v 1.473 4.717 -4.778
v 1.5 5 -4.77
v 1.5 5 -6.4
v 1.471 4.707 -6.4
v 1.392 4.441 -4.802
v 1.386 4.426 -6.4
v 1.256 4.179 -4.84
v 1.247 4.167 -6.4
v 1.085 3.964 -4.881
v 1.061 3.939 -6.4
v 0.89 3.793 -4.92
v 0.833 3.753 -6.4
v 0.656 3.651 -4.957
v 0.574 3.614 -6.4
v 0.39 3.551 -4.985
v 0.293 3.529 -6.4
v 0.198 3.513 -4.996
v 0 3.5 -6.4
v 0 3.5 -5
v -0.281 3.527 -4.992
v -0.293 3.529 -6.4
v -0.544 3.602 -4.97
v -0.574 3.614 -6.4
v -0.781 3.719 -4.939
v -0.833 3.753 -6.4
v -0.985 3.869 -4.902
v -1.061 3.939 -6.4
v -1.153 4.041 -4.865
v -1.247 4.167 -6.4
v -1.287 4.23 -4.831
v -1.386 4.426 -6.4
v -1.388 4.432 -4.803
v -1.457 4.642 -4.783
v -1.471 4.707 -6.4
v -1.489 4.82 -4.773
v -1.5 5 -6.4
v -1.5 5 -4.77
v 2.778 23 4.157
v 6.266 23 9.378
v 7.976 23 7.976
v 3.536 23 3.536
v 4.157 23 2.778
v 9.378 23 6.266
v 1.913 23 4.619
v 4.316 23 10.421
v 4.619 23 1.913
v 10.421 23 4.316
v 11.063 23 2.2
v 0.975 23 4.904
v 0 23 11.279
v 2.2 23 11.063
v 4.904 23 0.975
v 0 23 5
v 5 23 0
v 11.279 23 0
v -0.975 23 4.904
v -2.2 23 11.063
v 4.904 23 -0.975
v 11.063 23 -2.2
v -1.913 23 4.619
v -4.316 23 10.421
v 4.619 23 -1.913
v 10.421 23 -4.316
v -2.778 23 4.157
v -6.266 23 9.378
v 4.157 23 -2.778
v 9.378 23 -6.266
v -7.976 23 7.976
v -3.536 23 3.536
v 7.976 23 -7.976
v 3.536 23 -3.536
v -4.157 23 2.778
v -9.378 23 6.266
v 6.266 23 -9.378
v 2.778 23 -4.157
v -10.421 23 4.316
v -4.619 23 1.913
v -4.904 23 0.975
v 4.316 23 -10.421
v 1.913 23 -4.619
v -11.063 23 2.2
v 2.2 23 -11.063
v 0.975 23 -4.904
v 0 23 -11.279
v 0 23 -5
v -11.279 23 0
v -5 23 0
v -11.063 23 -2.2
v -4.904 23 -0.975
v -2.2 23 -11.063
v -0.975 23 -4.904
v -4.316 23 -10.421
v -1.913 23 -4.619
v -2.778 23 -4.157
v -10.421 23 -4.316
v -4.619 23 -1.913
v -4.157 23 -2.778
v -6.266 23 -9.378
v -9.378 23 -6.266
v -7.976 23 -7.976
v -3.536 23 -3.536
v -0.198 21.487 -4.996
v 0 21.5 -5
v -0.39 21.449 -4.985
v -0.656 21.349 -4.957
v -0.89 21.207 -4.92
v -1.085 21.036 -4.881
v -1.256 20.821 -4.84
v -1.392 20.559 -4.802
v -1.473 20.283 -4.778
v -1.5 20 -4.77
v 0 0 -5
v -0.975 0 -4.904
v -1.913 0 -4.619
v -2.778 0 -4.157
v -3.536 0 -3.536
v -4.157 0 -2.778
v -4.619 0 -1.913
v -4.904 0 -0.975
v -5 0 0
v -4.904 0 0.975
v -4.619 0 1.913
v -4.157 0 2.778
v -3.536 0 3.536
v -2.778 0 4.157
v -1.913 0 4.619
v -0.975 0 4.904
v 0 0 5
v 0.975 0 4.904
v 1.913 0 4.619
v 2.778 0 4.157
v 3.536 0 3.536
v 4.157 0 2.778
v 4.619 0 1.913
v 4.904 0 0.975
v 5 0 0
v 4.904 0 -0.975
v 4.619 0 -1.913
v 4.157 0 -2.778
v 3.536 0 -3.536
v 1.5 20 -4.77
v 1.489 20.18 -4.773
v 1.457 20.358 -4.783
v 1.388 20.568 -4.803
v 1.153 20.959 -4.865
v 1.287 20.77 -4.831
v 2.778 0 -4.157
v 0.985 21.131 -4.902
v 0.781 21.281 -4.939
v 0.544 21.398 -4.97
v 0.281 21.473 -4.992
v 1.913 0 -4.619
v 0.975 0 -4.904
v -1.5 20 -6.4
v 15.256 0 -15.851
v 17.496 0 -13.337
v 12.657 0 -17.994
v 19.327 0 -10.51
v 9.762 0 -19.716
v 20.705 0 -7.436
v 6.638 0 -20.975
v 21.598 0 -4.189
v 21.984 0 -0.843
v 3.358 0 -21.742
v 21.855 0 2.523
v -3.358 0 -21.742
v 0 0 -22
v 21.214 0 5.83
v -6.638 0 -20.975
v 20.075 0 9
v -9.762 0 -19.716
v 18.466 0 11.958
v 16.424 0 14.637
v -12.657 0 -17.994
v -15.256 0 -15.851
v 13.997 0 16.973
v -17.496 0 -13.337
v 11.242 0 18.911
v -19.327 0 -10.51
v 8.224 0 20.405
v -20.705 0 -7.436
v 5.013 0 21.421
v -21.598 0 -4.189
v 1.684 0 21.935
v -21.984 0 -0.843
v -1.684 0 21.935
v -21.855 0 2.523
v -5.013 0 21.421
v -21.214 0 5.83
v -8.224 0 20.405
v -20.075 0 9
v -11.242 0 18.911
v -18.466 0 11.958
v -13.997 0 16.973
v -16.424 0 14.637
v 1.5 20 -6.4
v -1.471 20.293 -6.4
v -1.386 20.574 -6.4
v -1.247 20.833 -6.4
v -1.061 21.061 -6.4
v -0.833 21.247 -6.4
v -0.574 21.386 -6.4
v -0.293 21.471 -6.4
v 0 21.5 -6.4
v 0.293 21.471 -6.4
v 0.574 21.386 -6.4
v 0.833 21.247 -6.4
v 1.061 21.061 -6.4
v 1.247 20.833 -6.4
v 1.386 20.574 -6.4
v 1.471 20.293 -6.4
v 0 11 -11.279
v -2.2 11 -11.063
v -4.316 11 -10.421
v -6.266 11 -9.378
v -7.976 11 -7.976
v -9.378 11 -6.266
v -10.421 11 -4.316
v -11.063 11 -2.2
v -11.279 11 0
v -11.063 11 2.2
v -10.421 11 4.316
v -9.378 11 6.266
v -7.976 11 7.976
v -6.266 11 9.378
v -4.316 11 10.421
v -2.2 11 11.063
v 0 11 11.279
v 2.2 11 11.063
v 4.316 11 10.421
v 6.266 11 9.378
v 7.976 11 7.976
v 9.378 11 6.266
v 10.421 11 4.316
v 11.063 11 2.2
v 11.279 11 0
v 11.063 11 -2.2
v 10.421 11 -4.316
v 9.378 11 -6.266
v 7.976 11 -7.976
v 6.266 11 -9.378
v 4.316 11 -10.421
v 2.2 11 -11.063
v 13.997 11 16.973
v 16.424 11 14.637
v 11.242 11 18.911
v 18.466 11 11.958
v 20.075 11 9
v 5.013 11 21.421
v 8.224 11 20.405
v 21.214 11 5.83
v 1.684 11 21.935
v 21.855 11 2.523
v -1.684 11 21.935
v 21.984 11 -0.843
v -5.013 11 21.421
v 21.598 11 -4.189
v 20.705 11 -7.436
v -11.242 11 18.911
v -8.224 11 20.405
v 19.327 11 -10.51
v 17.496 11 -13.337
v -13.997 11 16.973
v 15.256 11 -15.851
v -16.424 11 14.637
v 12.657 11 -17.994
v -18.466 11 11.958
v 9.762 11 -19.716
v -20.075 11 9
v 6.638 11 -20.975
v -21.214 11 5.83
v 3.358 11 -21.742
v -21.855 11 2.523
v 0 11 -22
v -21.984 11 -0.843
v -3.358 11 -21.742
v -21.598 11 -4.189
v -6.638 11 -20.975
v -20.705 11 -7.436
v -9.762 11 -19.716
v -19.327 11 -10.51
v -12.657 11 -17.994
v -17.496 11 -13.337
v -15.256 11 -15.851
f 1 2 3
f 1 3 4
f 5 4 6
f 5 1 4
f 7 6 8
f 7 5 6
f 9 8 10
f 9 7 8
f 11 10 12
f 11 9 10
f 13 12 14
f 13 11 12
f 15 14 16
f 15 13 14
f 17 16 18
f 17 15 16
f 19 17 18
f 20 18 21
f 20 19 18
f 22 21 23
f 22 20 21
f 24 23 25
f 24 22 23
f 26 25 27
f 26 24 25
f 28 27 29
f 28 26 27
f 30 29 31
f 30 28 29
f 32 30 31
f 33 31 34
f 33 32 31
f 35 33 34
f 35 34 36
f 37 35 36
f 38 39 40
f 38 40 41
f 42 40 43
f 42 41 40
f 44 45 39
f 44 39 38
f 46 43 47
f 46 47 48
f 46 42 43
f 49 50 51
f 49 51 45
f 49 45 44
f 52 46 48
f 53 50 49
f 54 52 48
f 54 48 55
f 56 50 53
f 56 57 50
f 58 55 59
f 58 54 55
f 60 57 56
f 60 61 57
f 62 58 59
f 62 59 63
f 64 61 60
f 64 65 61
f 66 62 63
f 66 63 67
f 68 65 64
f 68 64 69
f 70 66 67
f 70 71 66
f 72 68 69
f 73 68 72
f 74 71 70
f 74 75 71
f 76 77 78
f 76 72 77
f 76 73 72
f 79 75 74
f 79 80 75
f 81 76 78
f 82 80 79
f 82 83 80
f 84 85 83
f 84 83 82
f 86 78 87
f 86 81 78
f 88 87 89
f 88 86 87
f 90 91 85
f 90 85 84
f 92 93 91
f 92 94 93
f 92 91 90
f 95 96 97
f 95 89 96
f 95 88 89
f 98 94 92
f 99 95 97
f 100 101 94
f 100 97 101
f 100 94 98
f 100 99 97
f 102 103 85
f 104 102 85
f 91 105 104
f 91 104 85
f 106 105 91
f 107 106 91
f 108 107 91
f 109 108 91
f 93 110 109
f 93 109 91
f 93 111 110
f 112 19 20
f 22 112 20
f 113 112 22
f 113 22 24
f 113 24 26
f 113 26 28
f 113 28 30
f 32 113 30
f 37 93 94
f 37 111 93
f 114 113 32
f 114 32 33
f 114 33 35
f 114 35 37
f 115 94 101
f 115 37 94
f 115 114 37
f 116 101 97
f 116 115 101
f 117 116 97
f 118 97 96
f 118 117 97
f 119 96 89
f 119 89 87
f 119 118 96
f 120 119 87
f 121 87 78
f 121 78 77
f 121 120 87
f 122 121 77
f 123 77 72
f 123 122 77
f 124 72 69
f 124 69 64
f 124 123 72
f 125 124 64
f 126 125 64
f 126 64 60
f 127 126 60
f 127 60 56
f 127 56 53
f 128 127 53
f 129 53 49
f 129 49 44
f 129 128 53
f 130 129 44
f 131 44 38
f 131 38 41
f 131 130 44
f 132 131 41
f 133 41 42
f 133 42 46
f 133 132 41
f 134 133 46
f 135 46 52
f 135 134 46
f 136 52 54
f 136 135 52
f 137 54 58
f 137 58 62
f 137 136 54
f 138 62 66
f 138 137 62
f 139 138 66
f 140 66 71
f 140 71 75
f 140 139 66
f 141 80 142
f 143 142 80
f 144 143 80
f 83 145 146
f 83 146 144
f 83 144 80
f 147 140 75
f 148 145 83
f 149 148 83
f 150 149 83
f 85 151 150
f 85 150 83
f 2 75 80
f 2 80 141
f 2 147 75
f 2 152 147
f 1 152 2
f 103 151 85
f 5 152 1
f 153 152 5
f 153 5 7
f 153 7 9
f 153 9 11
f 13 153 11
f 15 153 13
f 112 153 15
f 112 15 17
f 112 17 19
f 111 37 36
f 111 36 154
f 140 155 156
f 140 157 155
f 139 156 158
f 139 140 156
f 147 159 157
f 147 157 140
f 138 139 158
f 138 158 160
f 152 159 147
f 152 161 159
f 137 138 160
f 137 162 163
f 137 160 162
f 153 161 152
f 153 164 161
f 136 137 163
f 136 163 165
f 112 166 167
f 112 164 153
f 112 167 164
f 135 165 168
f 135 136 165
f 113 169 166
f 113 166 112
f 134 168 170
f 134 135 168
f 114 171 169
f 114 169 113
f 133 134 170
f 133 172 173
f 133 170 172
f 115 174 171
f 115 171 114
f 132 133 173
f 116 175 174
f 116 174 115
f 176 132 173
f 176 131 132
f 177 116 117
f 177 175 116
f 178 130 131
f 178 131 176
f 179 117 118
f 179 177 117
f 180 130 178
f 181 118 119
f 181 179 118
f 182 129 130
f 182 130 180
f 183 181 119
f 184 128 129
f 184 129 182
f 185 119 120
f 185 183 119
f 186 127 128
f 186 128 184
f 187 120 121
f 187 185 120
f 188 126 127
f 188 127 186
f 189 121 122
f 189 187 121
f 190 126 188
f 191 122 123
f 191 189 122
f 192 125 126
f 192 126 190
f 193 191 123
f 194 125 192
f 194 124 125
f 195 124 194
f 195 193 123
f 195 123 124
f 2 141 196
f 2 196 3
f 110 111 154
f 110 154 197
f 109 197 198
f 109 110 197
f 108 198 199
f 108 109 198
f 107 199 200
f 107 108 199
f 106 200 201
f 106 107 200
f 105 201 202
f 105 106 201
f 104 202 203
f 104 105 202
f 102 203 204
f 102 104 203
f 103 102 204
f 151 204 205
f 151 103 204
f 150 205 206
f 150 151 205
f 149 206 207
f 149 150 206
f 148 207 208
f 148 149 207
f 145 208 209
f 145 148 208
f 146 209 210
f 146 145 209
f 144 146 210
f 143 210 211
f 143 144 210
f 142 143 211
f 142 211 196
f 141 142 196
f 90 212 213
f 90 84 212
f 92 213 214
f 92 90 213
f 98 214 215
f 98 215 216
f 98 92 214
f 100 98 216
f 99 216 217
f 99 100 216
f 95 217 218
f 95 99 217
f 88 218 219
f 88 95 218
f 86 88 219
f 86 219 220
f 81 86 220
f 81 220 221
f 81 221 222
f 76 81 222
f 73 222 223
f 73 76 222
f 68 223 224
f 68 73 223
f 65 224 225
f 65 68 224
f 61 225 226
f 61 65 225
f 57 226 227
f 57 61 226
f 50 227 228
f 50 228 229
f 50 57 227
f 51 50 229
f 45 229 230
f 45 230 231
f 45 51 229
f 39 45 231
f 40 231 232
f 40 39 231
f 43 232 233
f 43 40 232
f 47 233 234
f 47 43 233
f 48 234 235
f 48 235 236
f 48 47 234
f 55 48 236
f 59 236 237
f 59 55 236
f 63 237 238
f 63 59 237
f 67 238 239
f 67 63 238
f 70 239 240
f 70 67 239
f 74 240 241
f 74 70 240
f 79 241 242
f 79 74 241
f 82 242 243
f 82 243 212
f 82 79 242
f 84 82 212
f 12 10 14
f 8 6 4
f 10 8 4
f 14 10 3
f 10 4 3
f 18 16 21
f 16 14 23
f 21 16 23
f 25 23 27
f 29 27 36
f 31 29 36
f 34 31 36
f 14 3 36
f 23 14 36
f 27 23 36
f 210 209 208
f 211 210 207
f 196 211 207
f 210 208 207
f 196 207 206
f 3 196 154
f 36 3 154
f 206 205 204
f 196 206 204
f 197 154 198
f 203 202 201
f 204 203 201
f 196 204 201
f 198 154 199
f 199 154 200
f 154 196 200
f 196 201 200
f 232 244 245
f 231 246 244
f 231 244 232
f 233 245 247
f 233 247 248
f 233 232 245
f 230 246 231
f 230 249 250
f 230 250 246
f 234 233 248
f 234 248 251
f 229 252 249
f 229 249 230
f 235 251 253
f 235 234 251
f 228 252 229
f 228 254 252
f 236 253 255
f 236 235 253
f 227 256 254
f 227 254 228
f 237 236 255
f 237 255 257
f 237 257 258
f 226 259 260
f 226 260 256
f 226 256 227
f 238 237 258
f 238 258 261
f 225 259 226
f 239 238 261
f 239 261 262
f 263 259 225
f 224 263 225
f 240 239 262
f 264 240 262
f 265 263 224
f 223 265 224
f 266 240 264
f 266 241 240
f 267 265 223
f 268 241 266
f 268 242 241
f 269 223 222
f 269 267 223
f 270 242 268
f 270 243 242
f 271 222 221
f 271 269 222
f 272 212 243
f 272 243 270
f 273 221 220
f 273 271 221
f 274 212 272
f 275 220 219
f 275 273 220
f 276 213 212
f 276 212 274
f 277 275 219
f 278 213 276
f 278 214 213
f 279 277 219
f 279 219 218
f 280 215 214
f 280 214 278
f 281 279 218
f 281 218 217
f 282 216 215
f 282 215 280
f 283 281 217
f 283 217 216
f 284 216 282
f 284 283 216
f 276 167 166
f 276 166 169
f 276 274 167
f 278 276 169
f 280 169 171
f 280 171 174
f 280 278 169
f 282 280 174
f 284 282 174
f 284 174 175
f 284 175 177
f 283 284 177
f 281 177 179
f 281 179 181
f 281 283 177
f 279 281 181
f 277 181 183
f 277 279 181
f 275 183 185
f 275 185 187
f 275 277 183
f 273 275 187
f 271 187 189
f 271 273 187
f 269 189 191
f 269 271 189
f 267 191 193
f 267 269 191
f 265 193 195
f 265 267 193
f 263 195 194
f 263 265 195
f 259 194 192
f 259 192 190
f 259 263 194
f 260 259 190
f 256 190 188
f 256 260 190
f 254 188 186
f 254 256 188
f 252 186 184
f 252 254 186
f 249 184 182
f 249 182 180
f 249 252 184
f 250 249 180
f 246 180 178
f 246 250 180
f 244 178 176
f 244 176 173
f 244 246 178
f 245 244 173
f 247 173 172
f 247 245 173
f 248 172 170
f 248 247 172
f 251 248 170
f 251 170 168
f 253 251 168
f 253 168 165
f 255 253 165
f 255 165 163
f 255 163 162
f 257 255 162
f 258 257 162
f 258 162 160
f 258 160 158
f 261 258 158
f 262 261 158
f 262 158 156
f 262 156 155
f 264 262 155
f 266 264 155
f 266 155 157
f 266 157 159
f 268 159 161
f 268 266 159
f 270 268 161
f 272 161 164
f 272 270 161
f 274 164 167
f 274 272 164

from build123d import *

# Parameters (mm, degrees)
CUT_EXTRUDE_1_DEPTH = 6.4


with BuildPart() as part:
    # Эскиз1 → Повернуть1 (revolve)
    with BuildSketch(Plane.XY, mode=Mode.PRIVATE) as revolve_1_sk:
        Polygon((5, 23), (5, 0), (22, 0), (22, 11), (11.27928518, 11), (11.27928518, 23), align=None)
    revolve(revolve_1_sk.sketch.rotate(Axis((0, 0, 0), (0, 1, 0)), 90), axis=Axis((0, 0, 0), (0, 1, 0)))

    # Эскиз2 → Вырез-Вытянуть1 (cut)
    with BuildSketch(Plane.XY):
        with BuildLine():
            Line((-1.5, 5), (-1.5, 20))
            ThreePointArc((-1.5, 20), (0, 21.5), (1.5, 20))
            Line((1.5, 20), (1.5, 5))
            ThreePointArc((1.5, 5), (0, 3.5), (-1.5, 5))
        make_face()
    extrude(amount=-CUT_EXTRUDE_1_DEPTH, mode=Mode.SUBTRACT)


solid = part.part
